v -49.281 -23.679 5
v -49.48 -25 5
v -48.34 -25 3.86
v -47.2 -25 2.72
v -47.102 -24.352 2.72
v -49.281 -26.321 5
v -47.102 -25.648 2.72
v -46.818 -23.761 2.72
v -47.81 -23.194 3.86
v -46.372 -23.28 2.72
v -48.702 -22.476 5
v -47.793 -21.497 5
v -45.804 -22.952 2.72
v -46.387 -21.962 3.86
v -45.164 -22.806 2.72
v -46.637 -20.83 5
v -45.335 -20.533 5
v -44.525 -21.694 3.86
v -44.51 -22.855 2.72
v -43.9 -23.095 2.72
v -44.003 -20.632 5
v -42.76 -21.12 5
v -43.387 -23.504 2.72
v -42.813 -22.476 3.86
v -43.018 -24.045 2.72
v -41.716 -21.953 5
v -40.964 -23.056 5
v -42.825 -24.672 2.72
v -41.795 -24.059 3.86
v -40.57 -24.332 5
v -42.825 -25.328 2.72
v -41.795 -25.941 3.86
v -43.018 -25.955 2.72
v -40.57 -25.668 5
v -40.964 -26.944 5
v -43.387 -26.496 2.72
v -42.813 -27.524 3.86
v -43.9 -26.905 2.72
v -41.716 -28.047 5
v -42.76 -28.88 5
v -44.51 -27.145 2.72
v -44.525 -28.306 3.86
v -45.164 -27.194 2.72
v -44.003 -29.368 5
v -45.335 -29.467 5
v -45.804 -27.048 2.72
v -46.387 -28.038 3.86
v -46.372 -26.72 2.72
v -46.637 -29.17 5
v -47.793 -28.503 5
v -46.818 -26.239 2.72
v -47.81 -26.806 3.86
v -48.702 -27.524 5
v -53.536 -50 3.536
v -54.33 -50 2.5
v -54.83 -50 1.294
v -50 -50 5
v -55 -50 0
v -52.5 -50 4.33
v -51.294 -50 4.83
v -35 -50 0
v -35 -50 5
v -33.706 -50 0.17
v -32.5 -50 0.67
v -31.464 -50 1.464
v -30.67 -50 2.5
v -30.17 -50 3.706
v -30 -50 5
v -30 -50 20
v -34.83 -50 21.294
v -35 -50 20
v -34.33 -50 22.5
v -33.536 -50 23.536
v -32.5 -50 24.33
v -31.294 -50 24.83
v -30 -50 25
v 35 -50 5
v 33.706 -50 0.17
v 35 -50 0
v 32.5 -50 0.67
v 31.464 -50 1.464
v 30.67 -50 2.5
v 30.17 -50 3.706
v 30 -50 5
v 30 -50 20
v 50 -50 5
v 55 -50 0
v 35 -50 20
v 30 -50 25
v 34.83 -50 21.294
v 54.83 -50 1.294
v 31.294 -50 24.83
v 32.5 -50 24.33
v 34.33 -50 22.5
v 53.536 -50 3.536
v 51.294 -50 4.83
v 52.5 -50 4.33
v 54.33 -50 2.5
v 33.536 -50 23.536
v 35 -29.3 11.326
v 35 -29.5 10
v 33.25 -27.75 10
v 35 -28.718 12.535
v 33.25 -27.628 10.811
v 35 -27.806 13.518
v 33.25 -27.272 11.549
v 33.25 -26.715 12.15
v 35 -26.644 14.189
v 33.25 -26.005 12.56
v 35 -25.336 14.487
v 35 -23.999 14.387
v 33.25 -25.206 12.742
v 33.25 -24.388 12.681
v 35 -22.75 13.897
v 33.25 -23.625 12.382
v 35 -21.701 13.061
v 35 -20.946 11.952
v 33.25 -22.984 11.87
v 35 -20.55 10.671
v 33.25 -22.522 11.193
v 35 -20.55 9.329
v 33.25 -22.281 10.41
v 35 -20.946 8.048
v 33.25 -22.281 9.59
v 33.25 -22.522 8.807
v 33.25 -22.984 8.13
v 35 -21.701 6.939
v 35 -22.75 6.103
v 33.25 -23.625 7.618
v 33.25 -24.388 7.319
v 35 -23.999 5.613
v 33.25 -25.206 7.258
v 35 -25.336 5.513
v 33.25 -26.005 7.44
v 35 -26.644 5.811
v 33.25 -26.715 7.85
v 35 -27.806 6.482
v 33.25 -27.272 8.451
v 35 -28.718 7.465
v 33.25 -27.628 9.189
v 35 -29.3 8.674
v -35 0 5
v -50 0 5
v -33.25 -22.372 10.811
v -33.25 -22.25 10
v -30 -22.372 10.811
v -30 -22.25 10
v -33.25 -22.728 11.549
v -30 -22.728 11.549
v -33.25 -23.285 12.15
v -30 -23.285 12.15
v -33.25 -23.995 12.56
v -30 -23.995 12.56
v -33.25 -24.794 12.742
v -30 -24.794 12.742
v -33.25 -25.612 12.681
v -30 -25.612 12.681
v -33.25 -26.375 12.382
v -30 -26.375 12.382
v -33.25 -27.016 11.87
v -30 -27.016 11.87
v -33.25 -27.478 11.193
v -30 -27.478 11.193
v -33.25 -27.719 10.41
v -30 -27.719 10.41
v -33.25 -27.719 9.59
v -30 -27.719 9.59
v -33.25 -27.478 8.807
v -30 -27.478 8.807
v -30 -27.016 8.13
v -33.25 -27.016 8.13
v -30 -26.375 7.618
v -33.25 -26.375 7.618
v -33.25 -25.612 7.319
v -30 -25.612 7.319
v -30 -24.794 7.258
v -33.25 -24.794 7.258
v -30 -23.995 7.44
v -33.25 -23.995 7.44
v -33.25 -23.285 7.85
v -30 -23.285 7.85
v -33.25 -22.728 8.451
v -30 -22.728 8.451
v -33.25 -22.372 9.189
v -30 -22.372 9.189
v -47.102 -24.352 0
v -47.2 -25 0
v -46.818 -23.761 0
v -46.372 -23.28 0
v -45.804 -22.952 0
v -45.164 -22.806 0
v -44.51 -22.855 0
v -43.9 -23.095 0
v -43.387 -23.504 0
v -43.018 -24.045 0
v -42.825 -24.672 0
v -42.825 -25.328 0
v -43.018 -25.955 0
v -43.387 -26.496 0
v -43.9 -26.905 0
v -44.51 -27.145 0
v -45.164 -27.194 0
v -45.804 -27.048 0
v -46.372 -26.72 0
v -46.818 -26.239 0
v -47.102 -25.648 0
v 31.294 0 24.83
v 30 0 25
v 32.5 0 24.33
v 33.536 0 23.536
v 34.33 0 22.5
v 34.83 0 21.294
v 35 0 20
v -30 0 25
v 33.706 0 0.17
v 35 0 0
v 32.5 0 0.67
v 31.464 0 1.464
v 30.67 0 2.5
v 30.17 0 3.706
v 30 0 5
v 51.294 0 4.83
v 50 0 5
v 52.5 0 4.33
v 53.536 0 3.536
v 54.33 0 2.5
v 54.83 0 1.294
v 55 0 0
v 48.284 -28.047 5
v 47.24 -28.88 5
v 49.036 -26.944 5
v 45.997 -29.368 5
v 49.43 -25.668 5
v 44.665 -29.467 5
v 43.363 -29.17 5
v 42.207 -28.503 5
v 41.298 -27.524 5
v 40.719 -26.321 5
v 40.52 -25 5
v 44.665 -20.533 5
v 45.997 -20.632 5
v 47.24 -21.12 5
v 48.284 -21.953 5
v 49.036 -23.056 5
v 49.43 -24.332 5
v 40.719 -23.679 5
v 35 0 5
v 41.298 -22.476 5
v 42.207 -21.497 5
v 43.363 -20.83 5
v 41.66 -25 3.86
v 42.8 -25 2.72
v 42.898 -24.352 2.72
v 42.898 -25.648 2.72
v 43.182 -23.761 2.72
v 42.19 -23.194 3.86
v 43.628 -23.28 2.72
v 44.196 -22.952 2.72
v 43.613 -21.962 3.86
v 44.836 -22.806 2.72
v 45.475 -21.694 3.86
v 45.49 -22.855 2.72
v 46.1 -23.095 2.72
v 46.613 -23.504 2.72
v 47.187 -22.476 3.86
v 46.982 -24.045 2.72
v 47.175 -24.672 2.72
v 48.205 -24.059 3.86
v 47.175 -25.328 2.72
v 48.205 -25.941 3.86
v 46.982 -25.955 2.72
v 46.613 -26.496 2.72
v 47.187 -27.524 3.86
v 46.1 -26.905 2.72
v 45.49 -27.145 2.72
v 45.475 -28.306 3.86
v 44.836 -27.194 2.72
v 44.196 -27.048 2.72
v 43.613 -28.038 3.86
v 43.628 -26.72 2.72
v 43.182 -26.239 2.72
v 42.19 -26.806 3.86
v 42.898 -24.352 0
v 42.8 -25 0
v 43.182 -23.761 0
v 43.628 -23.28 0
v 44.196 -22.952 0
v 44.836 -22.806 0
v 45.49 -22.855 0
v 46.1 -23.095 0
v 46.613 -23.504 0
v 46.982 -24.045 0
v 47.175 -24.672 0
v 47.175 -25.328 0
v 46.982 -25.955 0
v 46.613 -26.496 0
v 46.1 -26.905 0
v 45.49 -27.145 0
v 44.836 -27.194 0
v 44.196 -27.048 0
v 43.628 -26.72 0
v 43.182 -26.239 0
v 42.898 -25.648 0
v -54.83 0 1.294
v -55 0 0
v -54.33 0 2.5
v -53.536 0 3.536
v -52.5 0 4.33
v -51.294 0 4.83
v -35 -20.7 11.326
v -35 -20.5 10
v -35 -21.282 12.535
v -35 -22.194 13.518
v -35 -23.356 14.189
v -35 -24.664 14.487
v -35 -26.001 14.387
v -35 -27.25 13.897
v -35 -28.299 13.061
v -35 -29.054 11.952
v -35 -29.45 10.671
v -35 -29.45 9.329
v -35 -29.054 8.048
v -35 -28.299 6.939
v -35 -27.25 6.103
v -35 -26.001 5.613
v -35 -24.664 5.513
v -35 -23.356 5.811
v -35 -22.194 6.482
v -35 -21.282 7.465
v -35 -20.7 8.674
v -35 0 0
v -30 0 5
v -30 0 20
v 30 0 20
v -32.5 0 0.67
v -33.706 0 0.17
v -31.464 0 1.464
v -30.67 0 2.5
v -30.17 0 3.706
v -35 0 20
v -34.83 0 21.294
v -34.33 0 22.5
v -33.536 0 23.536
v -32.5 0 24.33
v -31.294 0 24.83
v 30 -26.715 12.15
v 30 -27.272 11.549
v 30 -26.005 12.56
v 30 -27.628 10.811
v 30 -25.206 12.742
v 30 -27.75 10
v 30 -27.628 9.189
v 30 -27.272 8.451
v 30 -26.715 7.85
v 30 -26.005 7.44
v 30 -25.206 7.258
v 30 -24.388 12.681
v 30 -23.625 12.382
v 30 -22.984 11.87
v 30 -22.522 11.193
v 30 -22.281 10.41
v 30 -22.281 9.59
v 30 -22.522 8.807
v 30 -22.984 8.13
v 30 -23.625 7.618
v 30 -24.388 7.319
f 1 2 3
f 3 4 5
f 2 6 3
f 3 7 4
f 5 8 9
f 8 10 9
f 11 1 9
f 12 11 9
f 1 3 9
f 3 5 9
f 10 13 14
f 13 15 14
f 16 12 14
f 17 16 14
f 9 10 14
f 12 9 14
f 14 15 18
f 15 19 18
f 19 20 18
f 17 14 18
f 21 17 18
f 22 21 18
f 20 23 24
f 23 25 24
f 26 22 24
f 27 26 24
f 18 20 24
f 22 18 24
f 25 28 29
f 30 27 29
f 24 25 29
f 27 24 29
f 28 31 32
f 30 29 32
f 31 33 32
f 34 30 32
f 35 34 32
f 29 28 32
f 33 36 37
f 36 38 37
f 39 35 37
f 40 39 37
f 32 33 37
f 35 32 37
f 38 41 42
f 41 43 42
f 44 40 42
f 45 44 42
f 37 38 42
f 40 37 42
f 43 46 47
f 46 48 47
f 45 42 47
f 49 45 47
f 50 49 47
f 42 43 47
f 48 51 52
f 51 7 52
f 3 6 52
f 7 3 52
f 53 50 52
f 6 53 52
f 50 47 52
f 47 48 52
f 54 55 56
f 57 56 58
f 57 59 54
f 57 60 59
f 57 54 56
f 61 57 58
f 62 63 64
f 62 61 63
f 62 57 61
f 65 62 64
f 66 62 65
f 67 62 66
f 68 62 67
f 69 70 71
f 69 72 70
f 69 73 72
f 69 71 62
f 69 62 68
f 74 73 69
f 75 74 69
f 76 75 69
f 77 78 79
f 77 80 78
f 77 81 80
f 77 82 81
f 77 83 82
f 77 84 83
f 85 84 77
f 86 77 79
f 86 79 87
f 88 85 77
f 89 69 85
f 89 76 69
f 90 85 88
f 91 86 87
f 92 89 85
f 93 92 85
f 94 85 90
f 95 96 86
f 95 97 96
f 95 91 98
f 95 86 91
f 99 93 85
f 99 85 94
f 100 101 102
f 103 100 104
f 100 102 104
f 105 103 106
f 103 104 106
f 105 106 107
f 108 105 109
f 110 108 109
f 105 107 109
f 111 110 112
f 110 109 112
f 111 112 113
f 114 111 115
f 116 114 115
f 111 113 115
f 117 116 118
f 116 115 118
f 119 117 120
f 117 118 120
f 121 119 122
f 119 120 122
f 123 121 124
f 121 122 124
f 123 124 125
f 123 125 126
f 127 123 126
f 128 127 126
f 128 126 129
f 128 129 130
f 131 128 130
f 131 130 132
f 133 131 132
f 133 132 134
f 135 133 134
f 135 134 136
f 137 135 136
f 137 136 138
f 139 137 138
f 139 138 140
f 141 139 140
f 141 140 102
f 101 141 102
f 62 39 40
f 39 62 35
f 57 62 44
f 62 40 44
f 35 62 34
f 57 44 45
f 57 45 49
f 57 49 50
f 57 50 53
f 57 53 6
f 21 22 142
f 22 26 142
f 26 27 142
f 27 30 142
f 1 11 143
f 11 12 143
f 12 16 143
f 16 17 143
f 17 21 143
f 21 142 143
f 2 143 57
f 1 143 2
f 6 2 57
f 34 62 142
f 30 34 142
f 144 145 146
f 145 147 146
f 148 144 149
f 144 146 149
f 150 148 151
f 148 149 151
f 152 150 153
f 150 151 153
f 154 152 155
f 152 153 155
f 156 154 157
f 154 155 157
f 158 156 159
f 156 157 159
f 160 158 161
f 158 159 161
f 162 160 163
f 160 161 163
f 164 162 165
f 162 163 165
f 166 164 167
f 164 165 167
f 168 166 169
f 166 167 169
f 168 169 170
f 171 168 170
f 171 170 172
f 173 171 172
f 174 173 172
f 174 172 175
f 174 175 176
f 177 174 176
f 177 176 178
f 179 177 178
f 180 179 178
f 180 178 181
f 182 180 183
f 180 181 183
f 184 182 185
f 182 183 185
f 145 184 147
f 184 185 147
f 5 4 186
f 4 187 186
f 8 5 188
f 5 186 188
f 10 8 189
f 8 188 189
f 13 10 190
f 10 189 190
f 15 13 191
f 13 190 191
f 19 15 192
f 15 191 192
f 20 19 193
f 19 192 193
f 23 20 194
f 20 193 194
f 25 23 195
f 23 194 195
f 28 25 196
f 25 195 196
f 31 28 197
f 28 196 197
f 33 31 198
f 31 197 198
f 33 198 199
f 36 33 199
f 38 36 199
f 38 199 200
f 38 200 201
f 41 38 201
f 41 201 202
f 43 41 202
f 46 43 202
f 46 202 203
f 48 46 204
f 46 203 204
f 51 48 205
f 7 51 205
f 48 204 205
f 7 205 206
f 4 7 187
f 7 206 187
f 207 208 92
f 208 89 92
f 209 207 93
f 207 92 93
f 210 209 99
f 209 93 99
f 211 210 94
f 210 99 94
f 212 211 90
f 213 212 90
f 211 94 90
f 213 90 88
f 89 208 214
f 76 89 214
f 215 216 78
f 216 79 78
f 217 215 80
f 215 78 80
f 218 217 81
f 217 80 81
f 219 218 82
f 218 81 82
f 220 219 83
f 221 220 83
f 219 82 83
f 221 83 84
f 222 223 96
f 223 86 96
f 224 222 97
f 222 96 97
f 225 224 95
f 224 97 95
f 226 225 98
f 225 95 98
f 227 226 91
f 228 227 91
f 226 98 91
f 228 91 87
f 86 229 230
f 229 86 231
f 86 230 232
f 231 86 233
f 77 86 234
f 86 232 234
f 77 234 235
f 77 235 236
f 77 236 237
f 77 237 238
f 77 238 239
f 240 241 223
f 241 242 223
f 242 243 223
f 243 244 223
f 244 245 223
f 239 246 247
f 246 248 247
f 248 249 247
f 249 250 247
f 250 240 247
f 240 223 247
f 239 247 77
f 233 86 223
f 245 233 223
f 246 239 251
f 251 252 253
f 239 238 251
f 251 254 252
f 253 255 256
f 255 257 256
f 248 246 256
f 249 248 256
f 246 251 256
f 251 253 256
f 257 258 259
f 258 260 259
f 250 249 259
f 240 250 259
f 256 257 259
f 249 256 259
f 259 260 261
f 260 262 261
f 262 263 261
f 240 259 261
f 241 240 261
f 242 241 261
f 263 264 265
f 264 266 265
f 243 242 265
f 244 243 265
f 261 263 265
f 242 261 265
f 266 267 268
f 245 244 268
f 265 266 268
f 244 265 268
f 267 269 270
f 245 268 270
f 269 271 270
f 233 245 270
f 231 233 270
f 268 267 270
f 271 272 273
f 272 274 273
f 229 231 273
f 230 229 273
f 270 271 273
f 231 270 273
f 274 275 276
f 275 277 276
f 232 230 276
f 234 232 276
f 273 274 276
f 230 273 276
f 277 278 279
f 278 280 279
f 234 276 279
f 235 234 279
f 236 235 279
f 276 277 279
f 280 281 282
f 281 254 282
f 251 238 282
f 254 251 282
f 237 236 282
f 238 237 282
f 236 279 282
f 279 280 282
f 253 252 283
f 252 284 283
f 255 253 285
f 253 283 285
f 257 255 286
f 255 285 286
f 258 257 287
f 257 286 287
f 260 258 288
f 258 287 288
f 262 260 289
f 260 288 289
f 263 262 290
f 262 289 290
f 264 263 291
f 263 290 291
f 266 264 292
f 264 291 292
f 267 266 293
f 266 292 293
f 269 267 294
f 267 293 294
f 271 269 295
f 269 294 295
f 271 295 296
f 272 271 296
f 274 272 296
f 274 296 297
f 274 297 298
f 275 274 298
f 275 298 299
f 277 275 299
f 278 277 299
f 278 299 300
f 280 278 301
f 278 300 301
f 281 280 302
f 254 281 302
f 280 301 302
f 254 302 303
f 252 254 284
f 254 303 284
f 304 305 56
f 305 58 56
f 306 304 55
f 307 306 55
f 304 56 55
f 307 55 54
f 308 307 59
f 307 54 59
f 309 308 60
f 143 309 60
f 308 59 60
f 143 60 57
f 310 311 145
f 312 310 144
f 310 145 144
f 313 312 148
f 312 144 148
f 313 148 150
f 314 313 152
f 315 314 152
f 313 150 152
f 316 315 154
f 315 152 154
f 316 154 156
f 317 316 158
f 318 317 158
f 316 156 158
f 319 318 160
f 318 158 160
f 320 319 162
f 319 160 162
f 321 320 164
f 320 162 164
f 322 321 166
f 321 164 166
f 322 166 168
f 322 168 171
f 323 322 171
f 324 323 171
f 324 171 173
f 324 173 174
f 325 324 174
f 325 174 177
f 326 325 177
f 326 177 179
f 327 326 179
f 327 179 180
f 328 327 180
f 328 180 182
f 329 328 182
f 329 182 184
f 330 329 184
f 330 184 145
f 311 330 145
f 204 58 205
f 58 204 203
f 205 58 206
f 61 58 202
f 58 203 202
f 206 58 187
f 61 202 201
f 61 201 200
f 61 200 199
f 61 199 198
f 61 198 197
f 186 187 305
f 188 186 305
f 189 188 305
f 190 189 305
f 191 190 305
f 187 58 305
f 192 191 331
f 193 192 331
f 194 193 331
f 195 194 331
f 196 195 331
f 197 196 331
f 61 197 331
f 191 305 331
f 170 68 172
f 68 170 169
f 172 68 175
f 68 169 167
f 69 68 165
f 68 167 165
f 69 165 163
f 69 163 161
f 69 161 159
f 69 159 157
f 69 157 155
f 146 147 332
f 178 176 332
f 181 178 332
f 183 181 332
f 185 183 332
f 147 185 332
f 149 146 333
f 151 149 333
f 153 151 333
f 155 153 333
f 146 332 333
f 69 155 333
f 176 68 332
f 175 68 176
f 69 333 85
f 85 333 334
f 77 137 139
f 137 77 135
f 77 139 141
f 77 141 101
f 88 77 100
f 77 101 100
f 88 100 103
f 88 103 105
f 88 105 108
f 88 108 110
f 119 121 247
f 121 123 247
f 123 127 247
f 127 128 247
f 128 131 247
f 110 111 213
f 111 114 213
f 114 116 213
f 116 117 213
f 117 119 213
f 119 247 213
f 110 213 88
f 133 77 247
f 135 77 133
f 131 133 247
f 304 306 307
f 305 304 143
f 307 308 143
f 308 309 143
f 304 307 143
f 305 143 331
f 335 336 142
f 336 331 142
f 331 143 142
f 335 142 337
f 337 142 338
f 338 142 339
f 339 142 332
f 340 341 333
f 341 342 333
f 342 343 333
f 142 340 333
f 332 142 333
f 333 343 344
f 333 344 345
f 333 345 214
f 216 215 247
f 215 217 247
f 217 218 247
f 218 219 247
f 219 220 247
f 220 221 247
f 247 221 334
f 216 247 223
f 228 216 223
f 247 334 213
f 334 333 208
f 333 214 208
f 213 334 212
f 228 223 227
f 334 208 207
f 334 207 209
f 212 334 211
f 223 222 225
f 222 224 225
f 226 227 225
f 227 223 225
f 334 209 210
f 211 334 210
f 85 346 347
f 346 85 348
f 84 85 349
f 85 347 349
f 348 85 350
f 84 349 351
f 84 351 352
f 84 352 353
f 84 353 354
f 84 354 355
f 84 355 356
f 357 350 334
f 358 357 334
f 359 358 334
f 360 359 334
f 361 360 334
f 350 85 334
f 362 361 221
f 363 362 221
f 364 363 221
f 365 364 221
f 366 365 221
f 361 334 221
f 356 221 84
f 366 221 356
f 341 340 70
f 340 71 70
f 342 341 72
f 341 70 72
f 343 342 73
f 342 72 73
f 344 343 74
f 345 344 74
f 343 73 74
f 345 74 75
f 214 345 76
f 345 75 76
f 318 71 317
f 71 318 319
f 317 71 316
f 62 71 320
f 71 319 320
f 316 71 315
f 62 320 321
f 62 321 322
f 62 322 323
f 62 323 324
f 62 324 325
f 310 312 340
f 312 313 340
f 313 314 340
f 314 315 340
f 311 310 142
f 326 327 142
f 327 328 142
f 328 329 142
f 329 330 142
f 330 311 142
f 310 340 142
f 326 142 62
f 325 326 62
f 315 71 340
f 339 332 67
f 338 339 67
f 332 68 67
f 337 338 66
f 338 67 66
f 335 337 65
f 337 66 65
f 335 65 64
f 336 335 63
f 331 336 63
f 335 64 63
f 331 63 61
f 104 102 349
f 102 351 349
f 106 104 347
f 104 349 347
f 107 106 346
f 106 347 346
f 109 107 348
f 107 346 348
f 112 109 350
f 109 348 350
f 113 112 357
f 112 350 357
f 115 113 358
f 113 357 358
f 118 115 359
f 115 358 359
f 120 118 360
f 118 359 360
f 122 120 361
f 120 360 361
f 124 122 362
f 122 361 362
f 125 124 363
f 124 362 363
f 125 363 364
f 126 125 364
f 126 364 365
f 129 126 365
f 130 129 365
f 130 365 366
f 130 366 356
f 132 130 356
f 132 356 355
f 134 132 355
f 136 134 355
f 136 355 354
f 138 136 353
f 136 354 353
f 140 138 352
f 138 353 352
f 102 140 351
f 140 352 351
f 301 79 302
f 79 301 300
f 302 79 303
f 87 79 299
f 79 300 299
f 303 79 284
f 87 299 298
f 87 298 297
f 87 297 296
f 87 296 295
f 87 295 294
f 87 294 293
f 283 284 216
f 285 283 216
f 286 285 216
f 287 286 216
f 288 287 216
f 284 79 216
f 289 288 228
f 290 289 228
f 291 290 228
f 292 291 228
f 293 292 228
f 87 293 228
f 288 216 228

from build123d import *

# Parameters (mm, degrees)
F1_DEPTH             = 50
F4_D                 = 4.4
F4_CSINK_D           = 8.96
F4_CSINK_ANGLE       = 90
F4_ON_F3_D           = 4.4
F4_ON_F3_CSINK_D     = 8.96
F4_ON_F3_CSINK_ANGLE = 90
F6_D                 = 5.5
F6_DEPTH             = 5
F6_CSINK_D           = 9
F6_CSINK_ANGLE       = 90
F6_TIP               = 1.6523667023
F8_D                 = 5.5
F8_DEPTH             = 5
F8_CSINK_D           = 9
F8_CSINK_ANGLE       = 90
F8_TIP               = 1.6523667023
F9_R                 = 4.99999


# Not quite as in the source:
# - a fillet or chamfer is up to 0.001 mm smaller than in the source, because OpenCascade refuses the exact size


with BuildPart() as f1:
    # F0 (on Front) → F1 (new body)
    with BuildSketch(Plane.XZ):
        Polygon((-55, 5), (-55, 0), (-30, 0), (-30, 20), (30, 20), (30, 0), (55, 0), (55, 5), (35, 5), (35, 25), (-35, 25), (-35, 5), align=None)
    extrude(amount=F1_DEPTH)

    # F4 (through all)
    with Locations(Plane.XY.offset(5)):
        with Locations((-45, -25)):
            CounterSinkHole(F4_D / 2, F4_CSINK_D / 2, counter_sink_angle=F4_CSINK_ANGLE)

    # F4 on F3 (through all)
    with Locations(Plane.XY.offset(5)):
        with Locations((45, -25)):
            CounterSinkHole(F4_ON_F3_D / 2, F4_ON_F3_CSINK_D / 2, counter_sink_angle=F4_ON_F3_CSINK_ANGLE)

    # F6
    with Locations(Plane(origin=(-35, 0, 0), x_dir=(0, -1, 0), z_dir=(-1, 0, 0))):
        with Locations((25, 10)):
            CounterSinkHole(F6_D / 2, F6_CSINK_D / 2, depth=F6_DEPTH, counter_sink_angle=F6_CSINK_ANGLE)
            with Locations((0, 0, -(F6_DEPTH + F6_TIP / 2))):  # 118° drill point
                Cone(0, F6_D / 2, F6_TIP, mode=Mode.SUBTRACT)

    # F8
    with Locations(Plane.YZ.offset(35)):
        with Locations((-25, 10)):
            CounterSinkHole(F8_D / 2, F8_CSINK_D / 2, depth=F8_DEPTH, counter_sink_angle=F8_CSINK_ANGLE)
            with Locations((0, 0, -(F8_DEPTH + F8_TIP / 2))):  # 118° drill point
                Cone(0, F8_D / 2, F8_TIP, mode=Mode.SUBTRACT)

    # F9 (radius 5 in the source; OpenCascade refuses exactly that, so slightly less here)
    f9_edges = [f1.edges().sort_by_distance(p)[0] for p in [
        (-30, -25, 0),
        (30, -25, 0),
        (-55, -25, 5),
        (55, -25, 5),
        (-35, -25, 25),
        (35, -25, 25),
    ]]
    fillet(f9_edges, radius=F9_R)


solid = f1.part
